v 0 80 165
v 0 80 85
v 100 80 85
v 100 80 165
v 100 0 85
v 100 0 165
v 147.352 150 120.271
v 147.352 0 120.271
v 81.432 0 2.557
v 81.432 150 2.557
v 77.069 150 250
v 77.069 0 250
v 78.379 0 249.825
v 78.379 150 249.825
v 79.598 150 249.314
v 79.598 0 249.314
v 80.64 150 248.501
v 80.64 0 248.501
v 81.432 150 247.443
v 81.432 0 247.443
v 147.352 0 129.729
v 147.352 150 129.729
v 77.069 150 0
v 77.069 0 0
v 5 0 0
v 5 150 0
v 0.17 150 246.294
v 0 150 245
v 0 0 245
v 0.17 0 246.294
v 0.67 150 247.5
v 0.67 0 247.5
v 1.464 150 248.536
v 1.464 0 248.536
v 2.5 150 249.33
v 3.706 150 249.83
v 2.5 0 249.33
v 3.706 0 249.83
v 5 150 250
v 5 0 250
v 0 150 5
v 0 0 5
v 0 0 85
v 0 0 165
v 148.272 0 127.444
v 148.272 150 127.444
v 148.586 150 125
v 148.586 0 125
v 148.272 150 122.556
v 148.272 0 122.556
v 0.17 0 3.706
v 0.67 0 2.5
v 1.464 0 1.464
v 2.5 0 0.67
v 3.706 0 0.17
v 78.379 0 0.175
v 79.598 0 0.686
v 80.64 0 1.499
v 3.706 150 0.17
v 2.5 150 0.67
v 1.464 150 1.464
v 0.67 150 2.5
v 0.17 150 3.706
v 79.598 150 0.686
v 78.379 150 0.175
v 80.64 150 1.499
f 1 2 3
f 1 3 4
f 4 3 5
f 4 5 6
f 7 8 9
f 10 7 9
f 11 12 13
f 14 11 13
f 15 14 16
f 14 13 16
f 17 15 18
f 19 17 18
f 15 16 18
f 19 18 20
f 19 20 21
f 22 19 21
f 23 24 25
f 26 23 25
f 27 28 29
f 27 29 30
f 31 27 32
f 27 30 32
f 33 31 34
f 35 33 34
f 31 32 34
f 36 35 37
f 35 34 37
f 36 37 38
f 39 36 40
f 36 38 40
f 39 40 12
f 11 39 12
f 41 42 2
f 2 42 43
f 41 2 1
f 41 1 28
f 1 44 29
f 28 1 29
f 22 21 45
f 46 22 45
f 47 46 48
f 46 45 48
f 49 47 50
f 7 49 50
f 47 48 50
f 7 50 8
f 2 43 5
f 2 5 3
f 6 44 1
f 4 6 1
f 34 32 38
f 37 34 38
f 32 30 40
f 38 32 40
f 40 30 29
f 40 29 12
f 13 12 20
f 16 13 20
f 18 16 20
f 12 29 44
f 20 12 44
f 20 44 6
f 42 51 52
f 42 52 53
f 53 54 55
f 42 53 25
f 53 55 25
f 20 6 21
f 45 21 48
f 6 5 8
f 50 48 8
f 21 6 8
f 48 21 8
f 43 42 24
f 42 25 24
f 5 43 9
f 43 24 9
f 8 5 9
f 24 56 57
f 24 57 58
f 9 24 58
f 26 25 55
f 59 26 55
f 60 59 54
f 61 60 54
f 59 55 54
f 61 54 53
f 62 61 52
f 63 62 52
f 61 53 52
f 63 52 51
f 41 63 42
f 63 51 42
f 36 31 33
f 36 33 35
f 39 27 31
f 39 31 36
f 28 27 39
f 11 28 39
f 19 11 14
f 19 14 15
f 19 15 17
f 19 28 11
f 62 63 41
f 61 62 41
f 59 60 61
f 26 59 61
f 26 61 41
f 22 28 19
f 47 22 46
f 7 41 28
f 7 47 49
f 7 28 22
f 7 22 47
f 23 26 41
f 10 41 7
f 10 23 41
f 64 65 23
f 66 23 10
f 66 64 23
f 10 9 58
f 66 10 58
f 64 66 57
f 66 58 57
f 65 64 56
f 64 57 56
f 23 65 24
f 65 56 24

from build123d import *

# Parameters (mm, degrees)
EXTRUDE_1_DEPTH     = 150
SKETCH_2_W          = 80
SKETCH_2_H          = 80
CUT_EXTRUDE_1_DEPTH = 100


with BuildPart() as part:
    # 草图1 → 凸台-拉伸1 (new body)
    with BuildSketch(Plane(origin=(0, 0, 0), x_dir=(1, 0, 0), z_dir=(0, 1, 0))):
        with BuildLine():
            Line((0, -5), (0, -245))
            ThreePointArc((0, -245), (1.464466094, -248.535533906), (5, -250))
            Line((5, -250), (77.069380487, -250))
            ThreePointArc((77.069380487, -250), (79.597711535, -249.313646035), (81.431910567, -247.443016845))
            Line((81.431910567, -247.443016845), (147.351808168, -129.728913986))
            ThreePointArc((147.351808168, -129.728913986), (148.585749894, -125), (147.351808168, -120.271086014))
            Line((147.351808168, -120.271086014), (81.431910567, -2.556983155))
            ThreePointArc((81.431910567, -2.556983155), (79.597711535, -0.686353965), (77.069380487, 0))
            Line((77.069380487, 0), (5, 0))
            ThreePointArc((5, 0), (1.464466094, -1.464466094), (0, -5))
        make_face()
    extrude(amount=EXTRUDE_1_DEPTH)

    # 草图2 → 切除-拉伸1 (cut)
    with BuildSketch(Plane.ZY):
        with Locations((125, 40)):
            Rectangle(SKETCH_2_W, SKETCH_2_H)
    extrude(amount=-CUT_EXTRUDE_1_DEPTH, mode=Mode.SUBTRACT)


solid = part.part
